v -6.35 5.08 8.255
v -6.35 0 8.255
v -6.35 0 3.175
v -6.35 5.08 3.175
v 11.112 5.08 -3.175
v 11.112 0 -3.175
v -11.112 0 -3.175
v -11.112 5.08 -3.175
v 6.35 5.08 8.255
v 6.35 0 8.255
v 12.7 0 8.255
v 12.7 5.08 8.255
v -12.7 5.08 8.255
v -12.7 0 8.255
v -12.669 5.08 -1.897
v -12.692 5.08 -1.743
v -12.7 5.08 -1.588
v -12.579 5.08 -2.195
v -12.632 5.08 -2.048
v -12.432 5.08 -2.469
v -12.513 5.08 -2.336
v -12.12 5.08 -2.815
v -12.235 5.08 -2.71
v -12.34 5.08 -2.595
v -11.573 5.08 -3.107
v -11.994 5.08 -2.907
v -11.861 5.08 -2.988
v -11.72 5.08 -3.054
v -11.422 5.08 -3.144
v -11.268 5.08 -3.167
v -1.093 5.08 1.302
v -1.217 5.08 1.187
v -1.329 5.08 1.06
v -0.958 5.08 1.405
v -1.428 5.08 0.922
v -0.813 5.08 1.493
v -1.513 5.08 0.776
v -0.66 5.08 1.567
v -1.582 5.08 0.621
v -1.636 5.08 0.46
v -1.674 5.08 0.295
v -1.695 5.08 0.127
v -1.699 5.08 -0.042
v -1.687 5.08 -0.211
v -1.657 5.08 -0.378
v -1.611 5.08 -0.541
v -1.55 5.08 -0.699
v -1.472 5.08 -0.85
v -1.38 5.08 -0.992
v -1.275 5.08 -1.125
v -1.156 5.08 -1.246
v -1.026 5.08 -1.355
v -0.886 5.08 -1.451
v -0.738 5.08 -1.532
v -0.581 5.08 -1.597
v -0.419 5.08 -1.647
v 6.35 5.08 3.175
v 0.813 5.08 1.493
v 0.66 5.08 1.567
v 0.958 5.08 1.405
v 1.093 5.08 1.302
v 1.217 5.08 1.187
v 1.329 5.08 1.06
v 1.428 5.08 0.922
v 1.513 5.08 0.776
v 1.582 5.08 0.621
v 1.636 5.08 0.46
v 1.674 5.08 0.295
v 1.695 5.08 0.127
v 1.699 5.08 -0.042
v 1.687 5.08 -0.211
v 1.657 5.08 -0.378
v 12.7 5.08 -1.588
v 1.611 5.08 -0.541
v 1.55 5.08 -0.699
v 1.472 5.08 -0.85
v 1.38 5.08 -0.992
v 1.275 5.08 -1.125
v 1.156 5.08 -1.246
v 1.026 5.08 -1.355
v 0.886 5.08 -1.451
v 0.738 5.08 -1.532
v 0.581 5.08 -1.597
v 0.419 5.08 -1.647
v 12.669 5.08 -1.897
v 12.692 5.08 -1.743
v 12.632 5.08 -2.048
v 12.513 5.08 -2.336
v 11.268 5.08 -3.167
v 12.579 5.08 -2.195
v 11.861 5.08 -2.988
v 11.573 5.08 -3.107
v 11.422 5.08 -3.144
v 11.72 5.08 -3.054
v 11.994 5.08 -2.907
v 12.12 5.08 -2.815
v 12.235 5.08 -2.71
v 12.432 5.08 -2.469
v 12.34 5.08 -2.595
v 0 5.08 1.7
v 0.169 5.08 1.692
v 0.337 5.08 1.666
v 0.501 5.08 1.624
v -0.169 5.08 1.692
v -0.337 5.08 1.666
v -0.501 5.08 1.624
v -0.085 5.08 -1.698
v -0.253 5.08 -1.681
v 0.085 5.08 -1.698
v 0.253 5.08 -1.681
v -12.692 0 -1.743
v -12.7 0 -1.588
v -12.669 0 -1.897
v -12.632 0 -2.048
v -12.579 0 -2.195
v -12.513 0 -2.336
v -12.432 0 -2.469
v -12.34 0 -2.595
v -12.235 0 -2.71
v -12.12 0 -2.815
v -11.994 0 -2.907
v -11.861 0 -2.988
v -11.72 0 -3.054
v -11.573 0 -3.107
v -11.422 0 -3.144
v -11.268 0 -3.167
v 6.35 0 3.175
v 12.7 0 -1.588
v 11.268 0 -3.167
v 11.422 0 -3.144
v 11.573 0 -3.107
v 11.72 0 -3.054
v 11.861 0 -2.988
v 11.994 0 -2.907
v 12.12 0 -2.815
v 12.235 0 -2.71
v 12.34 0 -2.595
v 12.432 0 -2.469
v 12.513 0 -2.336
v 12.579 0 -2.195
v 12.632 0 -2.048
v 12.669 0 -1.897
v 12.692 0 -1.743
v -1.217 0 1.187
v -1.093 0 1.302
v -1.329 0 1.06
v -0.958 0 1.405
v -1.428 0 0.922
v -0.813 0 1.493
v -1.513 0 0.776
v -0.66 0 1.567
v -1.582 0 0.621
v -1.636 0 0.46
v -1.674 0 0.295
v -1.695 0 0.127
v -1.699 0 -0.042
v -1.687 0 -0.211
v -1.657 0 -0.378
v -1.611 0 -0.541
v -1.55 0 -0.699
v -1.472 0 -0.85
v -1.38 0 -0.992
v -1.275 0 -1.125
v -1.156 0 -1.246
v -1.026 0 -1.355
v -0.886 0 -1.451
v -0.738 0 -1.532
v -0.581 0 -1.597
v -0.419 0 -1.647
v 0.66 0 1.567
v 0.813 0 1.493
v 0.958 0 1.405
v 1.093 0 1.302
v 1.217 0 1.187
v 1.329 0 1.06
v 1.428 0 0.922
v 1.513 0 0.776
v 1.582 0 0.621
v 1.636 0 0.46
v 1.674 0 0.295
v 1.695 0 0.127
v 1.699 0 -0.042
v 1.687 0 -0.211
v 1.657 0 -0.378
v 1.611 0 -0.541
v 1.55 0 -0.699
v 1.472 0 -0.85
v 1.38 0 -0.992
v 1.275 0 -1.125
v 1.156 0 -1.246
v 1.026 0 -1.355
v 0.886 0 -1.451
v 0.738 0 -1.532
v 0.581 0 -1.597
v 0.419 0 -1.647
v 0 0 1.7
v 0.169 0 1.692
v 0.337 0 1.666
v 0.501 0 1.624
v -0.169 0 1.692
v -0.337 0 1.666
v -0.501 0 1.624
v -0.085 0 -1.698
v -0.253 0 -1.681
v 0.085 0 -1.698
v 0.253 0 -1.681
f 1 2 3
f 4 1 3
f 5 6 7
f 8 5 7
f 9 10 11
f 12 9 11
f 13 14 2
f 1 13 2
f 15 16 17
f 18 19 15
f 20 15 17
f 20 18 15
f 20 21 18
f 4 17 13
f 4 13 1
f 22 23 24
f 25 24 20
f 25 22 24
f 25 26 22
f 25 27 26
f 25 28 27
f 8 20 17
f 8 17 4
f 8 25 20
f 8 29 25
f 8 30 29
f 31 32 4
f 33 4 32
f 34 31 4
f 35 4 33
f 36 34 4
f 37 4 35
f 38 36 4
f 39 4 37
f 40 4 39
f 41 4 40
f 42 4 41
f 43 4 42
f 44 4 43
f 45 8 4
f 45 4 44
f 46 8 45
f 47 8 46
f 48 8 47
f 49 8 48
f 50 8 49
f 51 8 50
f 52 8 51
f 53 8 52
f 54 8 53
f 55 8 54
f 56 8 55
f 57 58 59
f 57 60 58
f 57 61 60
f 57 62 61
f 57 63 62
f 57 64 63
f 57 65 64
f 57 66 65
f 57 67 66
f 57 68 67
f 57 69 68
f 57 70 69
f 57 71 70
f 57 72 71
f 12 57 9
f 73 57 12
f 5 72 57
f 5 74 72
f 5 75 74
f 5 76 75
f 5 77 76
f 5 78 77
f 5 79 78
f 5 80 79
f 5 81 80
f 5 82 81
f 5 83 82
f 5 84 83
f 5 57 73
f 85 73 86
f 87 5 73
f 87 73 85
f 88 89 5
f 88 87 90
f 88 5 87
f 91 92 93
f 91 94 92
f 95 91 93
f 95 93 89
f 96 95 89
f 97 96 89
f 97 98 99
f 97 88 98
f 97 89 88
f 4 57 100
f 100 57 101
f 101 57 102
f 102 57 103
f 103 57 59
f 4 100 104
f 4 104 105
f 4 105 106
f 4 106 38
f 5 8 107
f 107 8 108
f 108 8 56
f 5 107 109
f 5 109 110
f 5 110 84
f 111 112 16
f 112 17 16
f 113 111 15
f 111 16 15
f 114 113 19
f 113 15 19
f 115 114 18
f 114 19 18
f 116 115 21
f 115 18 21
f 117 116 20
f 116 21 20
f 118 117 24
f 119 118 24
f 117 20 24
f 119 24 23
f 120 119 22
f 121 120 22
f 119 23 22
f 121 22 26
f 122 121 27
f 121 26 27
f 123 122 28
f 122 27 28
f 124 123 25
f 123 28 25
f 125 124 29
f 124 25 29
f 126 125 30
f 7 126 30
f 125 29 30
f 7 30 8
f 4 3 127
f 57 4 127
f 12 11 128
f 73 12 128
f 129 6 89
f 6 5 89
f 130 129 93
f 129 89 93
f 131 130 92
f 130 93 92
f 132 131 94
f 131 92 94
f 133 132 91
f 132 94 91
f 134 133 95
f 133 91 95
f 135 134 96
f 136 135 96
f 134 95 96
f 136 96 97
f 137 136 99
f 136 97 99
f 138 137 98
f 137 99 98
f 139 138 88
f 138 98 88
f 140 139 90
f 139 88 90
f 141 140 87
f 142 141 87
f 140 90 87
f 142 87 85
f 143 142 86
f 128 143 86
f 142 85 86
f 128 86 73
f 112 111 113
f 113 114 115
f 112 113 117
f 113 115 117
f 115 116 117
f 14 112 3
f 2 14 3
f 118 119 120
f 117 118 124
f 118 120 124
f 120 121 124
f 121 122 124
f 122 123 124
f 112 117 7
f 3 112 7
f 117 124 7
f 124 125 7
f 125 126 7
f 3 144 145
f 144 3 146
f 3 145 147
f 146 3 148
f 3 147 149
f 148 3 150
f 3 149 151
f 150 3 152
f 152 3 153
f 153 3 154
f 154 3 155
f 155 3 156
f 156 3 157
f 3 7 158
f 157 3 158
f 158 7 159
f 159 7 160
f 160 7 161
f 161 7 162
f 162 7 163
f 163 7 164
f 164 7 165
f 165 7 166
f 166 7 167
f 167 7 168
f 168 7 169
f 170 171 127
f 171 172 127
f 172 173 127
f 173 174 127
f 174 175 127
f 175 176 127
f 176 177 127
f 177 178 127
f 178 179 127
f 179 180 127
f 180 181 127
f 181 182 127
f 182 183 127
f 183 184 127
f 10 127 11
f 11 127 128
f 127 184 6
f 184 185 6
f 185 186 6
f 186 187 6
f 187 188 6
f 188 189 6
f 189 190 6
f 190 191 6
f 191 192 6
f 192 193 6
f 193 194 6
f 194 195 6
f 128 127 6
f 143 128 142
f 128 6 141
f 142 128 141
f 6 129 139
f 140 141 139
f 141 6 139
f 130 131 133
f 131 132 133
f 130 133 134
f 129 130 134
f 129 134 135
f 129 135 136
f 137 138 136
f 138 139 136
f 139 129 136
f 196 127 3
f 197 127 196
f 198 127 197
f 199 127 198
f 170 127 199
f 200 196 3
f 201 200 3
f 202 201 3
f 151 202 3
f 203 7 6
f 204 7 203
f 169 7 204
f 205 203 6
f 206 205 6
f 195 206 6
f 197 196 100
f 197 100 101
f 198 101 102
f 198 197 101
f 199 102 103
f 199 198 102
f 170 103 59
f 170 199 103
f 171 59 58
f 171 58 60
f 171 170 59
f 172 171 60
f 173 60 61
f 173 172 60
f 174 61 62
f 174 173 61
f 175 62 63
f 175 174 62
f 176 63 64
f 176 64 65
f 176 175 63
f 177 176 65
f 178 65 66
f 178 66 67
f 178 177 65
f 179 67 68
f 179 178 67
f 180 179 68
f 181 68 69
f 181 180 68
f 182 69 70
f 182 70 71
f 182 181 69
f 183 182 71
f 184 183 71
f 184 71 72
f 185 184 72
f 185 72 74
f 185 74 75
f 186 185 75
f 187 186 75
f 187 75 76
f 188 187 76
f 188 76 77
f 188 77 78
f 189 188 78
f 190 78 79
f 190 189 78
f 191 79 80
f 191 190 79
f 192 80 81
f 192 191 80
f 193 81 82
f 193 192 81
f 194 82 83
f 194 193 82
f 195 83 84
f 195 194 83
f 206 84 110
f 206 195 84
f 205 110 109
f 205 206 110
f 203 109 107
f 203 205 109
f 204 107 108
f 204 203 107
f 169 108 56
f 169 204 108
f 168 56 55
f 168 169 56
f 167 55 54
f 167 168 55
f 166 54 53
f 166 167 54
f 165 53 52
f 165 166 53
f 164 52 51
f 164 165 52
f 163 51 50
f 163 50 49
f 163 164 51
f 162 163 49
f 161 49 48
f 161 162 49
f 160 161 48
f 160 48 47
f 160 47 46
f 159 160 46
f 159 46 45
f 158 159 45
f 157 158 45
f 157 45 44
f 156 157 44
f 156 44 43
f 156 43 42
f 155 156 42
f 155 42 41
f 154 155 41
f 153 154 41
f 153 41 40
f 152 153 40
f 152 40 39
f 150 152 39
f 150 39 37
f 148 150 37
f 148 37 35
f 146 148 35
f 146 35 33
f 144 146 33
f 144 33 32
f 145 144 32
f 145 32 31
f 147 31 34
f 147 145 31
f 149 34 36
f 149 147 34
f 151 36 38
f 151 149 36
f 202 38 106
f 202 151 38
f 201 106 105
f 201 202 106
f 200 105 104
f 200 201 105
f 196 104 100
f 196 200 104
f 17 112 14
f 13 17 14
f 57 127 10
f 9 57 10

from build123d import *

# Parameters (mm, degrees)
SKETCH1_R           = 1.7
BOSS_EXTRUDE1_DEPTH = 5.08
FILLET1_R           = 1.5875


with BuildPart() as part:
    # Sketch1 → Boss-Extrude1 (new body)
    with BuildSketch(Plane(origin=(0, 0, 0), x_dir=(1, 0, 0), z_dir=(0, 1, 0))):
        Polygon((-12.7, -3.175), (-12.7, -8.255), (-6.35, -8.255), (-6.35, -3.175), (6.35, -3.175), (6.35, -8.255), (12.7, -8.255), (12.7, -3.175), (12.7, 3.175), (-12.7, 3.175), align=None)
        with Locations(Location((0, 0, 0), (0, 0, 270))):
            Circle(SKETCH1_R, mode=Mode.SUBTRACT)
    extrude(amount=BOSS_EXTRUDE1_DEPTH)

    # Fillet1
    fillet1_edges = [part.edges().sort_by_distance(p)[0] for p in [
        (-12.7, 2.54, -3.175),
        (12.7, 2.54, -3.175),
    ]]
    fillet(fillet1_edges, radius=FILLET1_R)


solid = part.part
